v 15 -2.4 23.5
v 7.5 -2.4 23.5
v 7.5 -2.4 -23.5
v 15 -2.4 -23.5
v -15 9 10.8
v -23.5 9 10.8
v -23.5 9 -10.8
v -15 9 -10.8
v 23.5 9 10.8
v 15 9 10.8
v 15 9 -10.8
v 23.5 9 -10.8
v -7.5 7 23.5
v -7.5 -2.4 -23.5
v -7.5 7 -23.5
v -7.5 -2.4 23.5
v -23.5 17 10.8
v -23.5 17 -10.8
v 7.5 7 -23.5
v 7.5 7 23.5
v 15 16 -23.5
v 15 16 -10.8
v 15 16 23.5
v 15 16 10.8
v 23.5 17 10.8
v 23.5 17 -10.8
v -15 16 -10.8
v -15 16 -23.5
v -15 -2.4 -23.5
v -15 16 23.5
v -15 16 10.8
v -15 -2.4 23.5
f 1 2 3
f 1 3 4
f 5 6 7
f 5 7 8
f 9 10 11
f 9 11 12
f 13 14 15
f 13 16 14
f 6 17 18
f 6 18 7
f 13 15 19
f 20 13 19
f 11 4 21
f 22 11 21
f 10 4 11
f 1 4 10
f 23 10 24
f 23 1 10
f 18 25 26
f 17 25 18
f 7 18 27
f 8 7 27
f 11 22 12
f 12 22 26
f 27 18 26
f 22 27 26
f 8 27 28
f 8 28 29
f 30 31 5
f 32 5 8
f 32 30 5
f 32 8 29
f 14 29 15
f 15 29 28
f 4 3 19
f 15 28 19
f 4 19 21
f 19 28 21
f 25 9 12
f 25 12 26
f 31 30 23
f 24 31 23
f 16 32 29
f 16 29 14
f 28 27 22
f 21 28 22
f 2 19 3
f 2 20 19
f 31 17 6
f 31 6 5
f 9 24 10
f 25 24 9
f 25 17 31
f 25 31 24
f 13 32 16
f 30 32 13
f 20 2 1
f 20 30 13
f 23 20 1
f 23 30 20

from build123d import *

# Parameters (mm, degrees)
BOSS_EXTRUDE1_DEPTH = 23.5
BOSS_EXTRUDE2_DEPTH = 10.8


with BuildPart() as part:
    # Sketch1 → Boss-Extrude1 (new, symmetric)
    with BuildSketch(Plane.XY):
        Polygon((7.5, 7), (7.5, -2.4), (15, -2.4), (15, 16), (-15, 16), (-15, -2.4), (-7.5, -2.4), (-7.5, 7), align=None)
    extrude(amount=BOSS_EXTRUDE1_DEPTH, both=True)

    # Sketch1<3> → Boss-Extrude2 (add, symmetric)
    with BuildSketch(Plane.XY):
        Polygon((15, 16), (15, 9), (23.5, 9), (23.5, 17), (-23.5, 17), (-23.5, 9), (-15, 9), (-15, 16), align=None)
    extrude(amount=BOSS_EXTRUDE2_DEPTH, both=True)


solid = part.part
